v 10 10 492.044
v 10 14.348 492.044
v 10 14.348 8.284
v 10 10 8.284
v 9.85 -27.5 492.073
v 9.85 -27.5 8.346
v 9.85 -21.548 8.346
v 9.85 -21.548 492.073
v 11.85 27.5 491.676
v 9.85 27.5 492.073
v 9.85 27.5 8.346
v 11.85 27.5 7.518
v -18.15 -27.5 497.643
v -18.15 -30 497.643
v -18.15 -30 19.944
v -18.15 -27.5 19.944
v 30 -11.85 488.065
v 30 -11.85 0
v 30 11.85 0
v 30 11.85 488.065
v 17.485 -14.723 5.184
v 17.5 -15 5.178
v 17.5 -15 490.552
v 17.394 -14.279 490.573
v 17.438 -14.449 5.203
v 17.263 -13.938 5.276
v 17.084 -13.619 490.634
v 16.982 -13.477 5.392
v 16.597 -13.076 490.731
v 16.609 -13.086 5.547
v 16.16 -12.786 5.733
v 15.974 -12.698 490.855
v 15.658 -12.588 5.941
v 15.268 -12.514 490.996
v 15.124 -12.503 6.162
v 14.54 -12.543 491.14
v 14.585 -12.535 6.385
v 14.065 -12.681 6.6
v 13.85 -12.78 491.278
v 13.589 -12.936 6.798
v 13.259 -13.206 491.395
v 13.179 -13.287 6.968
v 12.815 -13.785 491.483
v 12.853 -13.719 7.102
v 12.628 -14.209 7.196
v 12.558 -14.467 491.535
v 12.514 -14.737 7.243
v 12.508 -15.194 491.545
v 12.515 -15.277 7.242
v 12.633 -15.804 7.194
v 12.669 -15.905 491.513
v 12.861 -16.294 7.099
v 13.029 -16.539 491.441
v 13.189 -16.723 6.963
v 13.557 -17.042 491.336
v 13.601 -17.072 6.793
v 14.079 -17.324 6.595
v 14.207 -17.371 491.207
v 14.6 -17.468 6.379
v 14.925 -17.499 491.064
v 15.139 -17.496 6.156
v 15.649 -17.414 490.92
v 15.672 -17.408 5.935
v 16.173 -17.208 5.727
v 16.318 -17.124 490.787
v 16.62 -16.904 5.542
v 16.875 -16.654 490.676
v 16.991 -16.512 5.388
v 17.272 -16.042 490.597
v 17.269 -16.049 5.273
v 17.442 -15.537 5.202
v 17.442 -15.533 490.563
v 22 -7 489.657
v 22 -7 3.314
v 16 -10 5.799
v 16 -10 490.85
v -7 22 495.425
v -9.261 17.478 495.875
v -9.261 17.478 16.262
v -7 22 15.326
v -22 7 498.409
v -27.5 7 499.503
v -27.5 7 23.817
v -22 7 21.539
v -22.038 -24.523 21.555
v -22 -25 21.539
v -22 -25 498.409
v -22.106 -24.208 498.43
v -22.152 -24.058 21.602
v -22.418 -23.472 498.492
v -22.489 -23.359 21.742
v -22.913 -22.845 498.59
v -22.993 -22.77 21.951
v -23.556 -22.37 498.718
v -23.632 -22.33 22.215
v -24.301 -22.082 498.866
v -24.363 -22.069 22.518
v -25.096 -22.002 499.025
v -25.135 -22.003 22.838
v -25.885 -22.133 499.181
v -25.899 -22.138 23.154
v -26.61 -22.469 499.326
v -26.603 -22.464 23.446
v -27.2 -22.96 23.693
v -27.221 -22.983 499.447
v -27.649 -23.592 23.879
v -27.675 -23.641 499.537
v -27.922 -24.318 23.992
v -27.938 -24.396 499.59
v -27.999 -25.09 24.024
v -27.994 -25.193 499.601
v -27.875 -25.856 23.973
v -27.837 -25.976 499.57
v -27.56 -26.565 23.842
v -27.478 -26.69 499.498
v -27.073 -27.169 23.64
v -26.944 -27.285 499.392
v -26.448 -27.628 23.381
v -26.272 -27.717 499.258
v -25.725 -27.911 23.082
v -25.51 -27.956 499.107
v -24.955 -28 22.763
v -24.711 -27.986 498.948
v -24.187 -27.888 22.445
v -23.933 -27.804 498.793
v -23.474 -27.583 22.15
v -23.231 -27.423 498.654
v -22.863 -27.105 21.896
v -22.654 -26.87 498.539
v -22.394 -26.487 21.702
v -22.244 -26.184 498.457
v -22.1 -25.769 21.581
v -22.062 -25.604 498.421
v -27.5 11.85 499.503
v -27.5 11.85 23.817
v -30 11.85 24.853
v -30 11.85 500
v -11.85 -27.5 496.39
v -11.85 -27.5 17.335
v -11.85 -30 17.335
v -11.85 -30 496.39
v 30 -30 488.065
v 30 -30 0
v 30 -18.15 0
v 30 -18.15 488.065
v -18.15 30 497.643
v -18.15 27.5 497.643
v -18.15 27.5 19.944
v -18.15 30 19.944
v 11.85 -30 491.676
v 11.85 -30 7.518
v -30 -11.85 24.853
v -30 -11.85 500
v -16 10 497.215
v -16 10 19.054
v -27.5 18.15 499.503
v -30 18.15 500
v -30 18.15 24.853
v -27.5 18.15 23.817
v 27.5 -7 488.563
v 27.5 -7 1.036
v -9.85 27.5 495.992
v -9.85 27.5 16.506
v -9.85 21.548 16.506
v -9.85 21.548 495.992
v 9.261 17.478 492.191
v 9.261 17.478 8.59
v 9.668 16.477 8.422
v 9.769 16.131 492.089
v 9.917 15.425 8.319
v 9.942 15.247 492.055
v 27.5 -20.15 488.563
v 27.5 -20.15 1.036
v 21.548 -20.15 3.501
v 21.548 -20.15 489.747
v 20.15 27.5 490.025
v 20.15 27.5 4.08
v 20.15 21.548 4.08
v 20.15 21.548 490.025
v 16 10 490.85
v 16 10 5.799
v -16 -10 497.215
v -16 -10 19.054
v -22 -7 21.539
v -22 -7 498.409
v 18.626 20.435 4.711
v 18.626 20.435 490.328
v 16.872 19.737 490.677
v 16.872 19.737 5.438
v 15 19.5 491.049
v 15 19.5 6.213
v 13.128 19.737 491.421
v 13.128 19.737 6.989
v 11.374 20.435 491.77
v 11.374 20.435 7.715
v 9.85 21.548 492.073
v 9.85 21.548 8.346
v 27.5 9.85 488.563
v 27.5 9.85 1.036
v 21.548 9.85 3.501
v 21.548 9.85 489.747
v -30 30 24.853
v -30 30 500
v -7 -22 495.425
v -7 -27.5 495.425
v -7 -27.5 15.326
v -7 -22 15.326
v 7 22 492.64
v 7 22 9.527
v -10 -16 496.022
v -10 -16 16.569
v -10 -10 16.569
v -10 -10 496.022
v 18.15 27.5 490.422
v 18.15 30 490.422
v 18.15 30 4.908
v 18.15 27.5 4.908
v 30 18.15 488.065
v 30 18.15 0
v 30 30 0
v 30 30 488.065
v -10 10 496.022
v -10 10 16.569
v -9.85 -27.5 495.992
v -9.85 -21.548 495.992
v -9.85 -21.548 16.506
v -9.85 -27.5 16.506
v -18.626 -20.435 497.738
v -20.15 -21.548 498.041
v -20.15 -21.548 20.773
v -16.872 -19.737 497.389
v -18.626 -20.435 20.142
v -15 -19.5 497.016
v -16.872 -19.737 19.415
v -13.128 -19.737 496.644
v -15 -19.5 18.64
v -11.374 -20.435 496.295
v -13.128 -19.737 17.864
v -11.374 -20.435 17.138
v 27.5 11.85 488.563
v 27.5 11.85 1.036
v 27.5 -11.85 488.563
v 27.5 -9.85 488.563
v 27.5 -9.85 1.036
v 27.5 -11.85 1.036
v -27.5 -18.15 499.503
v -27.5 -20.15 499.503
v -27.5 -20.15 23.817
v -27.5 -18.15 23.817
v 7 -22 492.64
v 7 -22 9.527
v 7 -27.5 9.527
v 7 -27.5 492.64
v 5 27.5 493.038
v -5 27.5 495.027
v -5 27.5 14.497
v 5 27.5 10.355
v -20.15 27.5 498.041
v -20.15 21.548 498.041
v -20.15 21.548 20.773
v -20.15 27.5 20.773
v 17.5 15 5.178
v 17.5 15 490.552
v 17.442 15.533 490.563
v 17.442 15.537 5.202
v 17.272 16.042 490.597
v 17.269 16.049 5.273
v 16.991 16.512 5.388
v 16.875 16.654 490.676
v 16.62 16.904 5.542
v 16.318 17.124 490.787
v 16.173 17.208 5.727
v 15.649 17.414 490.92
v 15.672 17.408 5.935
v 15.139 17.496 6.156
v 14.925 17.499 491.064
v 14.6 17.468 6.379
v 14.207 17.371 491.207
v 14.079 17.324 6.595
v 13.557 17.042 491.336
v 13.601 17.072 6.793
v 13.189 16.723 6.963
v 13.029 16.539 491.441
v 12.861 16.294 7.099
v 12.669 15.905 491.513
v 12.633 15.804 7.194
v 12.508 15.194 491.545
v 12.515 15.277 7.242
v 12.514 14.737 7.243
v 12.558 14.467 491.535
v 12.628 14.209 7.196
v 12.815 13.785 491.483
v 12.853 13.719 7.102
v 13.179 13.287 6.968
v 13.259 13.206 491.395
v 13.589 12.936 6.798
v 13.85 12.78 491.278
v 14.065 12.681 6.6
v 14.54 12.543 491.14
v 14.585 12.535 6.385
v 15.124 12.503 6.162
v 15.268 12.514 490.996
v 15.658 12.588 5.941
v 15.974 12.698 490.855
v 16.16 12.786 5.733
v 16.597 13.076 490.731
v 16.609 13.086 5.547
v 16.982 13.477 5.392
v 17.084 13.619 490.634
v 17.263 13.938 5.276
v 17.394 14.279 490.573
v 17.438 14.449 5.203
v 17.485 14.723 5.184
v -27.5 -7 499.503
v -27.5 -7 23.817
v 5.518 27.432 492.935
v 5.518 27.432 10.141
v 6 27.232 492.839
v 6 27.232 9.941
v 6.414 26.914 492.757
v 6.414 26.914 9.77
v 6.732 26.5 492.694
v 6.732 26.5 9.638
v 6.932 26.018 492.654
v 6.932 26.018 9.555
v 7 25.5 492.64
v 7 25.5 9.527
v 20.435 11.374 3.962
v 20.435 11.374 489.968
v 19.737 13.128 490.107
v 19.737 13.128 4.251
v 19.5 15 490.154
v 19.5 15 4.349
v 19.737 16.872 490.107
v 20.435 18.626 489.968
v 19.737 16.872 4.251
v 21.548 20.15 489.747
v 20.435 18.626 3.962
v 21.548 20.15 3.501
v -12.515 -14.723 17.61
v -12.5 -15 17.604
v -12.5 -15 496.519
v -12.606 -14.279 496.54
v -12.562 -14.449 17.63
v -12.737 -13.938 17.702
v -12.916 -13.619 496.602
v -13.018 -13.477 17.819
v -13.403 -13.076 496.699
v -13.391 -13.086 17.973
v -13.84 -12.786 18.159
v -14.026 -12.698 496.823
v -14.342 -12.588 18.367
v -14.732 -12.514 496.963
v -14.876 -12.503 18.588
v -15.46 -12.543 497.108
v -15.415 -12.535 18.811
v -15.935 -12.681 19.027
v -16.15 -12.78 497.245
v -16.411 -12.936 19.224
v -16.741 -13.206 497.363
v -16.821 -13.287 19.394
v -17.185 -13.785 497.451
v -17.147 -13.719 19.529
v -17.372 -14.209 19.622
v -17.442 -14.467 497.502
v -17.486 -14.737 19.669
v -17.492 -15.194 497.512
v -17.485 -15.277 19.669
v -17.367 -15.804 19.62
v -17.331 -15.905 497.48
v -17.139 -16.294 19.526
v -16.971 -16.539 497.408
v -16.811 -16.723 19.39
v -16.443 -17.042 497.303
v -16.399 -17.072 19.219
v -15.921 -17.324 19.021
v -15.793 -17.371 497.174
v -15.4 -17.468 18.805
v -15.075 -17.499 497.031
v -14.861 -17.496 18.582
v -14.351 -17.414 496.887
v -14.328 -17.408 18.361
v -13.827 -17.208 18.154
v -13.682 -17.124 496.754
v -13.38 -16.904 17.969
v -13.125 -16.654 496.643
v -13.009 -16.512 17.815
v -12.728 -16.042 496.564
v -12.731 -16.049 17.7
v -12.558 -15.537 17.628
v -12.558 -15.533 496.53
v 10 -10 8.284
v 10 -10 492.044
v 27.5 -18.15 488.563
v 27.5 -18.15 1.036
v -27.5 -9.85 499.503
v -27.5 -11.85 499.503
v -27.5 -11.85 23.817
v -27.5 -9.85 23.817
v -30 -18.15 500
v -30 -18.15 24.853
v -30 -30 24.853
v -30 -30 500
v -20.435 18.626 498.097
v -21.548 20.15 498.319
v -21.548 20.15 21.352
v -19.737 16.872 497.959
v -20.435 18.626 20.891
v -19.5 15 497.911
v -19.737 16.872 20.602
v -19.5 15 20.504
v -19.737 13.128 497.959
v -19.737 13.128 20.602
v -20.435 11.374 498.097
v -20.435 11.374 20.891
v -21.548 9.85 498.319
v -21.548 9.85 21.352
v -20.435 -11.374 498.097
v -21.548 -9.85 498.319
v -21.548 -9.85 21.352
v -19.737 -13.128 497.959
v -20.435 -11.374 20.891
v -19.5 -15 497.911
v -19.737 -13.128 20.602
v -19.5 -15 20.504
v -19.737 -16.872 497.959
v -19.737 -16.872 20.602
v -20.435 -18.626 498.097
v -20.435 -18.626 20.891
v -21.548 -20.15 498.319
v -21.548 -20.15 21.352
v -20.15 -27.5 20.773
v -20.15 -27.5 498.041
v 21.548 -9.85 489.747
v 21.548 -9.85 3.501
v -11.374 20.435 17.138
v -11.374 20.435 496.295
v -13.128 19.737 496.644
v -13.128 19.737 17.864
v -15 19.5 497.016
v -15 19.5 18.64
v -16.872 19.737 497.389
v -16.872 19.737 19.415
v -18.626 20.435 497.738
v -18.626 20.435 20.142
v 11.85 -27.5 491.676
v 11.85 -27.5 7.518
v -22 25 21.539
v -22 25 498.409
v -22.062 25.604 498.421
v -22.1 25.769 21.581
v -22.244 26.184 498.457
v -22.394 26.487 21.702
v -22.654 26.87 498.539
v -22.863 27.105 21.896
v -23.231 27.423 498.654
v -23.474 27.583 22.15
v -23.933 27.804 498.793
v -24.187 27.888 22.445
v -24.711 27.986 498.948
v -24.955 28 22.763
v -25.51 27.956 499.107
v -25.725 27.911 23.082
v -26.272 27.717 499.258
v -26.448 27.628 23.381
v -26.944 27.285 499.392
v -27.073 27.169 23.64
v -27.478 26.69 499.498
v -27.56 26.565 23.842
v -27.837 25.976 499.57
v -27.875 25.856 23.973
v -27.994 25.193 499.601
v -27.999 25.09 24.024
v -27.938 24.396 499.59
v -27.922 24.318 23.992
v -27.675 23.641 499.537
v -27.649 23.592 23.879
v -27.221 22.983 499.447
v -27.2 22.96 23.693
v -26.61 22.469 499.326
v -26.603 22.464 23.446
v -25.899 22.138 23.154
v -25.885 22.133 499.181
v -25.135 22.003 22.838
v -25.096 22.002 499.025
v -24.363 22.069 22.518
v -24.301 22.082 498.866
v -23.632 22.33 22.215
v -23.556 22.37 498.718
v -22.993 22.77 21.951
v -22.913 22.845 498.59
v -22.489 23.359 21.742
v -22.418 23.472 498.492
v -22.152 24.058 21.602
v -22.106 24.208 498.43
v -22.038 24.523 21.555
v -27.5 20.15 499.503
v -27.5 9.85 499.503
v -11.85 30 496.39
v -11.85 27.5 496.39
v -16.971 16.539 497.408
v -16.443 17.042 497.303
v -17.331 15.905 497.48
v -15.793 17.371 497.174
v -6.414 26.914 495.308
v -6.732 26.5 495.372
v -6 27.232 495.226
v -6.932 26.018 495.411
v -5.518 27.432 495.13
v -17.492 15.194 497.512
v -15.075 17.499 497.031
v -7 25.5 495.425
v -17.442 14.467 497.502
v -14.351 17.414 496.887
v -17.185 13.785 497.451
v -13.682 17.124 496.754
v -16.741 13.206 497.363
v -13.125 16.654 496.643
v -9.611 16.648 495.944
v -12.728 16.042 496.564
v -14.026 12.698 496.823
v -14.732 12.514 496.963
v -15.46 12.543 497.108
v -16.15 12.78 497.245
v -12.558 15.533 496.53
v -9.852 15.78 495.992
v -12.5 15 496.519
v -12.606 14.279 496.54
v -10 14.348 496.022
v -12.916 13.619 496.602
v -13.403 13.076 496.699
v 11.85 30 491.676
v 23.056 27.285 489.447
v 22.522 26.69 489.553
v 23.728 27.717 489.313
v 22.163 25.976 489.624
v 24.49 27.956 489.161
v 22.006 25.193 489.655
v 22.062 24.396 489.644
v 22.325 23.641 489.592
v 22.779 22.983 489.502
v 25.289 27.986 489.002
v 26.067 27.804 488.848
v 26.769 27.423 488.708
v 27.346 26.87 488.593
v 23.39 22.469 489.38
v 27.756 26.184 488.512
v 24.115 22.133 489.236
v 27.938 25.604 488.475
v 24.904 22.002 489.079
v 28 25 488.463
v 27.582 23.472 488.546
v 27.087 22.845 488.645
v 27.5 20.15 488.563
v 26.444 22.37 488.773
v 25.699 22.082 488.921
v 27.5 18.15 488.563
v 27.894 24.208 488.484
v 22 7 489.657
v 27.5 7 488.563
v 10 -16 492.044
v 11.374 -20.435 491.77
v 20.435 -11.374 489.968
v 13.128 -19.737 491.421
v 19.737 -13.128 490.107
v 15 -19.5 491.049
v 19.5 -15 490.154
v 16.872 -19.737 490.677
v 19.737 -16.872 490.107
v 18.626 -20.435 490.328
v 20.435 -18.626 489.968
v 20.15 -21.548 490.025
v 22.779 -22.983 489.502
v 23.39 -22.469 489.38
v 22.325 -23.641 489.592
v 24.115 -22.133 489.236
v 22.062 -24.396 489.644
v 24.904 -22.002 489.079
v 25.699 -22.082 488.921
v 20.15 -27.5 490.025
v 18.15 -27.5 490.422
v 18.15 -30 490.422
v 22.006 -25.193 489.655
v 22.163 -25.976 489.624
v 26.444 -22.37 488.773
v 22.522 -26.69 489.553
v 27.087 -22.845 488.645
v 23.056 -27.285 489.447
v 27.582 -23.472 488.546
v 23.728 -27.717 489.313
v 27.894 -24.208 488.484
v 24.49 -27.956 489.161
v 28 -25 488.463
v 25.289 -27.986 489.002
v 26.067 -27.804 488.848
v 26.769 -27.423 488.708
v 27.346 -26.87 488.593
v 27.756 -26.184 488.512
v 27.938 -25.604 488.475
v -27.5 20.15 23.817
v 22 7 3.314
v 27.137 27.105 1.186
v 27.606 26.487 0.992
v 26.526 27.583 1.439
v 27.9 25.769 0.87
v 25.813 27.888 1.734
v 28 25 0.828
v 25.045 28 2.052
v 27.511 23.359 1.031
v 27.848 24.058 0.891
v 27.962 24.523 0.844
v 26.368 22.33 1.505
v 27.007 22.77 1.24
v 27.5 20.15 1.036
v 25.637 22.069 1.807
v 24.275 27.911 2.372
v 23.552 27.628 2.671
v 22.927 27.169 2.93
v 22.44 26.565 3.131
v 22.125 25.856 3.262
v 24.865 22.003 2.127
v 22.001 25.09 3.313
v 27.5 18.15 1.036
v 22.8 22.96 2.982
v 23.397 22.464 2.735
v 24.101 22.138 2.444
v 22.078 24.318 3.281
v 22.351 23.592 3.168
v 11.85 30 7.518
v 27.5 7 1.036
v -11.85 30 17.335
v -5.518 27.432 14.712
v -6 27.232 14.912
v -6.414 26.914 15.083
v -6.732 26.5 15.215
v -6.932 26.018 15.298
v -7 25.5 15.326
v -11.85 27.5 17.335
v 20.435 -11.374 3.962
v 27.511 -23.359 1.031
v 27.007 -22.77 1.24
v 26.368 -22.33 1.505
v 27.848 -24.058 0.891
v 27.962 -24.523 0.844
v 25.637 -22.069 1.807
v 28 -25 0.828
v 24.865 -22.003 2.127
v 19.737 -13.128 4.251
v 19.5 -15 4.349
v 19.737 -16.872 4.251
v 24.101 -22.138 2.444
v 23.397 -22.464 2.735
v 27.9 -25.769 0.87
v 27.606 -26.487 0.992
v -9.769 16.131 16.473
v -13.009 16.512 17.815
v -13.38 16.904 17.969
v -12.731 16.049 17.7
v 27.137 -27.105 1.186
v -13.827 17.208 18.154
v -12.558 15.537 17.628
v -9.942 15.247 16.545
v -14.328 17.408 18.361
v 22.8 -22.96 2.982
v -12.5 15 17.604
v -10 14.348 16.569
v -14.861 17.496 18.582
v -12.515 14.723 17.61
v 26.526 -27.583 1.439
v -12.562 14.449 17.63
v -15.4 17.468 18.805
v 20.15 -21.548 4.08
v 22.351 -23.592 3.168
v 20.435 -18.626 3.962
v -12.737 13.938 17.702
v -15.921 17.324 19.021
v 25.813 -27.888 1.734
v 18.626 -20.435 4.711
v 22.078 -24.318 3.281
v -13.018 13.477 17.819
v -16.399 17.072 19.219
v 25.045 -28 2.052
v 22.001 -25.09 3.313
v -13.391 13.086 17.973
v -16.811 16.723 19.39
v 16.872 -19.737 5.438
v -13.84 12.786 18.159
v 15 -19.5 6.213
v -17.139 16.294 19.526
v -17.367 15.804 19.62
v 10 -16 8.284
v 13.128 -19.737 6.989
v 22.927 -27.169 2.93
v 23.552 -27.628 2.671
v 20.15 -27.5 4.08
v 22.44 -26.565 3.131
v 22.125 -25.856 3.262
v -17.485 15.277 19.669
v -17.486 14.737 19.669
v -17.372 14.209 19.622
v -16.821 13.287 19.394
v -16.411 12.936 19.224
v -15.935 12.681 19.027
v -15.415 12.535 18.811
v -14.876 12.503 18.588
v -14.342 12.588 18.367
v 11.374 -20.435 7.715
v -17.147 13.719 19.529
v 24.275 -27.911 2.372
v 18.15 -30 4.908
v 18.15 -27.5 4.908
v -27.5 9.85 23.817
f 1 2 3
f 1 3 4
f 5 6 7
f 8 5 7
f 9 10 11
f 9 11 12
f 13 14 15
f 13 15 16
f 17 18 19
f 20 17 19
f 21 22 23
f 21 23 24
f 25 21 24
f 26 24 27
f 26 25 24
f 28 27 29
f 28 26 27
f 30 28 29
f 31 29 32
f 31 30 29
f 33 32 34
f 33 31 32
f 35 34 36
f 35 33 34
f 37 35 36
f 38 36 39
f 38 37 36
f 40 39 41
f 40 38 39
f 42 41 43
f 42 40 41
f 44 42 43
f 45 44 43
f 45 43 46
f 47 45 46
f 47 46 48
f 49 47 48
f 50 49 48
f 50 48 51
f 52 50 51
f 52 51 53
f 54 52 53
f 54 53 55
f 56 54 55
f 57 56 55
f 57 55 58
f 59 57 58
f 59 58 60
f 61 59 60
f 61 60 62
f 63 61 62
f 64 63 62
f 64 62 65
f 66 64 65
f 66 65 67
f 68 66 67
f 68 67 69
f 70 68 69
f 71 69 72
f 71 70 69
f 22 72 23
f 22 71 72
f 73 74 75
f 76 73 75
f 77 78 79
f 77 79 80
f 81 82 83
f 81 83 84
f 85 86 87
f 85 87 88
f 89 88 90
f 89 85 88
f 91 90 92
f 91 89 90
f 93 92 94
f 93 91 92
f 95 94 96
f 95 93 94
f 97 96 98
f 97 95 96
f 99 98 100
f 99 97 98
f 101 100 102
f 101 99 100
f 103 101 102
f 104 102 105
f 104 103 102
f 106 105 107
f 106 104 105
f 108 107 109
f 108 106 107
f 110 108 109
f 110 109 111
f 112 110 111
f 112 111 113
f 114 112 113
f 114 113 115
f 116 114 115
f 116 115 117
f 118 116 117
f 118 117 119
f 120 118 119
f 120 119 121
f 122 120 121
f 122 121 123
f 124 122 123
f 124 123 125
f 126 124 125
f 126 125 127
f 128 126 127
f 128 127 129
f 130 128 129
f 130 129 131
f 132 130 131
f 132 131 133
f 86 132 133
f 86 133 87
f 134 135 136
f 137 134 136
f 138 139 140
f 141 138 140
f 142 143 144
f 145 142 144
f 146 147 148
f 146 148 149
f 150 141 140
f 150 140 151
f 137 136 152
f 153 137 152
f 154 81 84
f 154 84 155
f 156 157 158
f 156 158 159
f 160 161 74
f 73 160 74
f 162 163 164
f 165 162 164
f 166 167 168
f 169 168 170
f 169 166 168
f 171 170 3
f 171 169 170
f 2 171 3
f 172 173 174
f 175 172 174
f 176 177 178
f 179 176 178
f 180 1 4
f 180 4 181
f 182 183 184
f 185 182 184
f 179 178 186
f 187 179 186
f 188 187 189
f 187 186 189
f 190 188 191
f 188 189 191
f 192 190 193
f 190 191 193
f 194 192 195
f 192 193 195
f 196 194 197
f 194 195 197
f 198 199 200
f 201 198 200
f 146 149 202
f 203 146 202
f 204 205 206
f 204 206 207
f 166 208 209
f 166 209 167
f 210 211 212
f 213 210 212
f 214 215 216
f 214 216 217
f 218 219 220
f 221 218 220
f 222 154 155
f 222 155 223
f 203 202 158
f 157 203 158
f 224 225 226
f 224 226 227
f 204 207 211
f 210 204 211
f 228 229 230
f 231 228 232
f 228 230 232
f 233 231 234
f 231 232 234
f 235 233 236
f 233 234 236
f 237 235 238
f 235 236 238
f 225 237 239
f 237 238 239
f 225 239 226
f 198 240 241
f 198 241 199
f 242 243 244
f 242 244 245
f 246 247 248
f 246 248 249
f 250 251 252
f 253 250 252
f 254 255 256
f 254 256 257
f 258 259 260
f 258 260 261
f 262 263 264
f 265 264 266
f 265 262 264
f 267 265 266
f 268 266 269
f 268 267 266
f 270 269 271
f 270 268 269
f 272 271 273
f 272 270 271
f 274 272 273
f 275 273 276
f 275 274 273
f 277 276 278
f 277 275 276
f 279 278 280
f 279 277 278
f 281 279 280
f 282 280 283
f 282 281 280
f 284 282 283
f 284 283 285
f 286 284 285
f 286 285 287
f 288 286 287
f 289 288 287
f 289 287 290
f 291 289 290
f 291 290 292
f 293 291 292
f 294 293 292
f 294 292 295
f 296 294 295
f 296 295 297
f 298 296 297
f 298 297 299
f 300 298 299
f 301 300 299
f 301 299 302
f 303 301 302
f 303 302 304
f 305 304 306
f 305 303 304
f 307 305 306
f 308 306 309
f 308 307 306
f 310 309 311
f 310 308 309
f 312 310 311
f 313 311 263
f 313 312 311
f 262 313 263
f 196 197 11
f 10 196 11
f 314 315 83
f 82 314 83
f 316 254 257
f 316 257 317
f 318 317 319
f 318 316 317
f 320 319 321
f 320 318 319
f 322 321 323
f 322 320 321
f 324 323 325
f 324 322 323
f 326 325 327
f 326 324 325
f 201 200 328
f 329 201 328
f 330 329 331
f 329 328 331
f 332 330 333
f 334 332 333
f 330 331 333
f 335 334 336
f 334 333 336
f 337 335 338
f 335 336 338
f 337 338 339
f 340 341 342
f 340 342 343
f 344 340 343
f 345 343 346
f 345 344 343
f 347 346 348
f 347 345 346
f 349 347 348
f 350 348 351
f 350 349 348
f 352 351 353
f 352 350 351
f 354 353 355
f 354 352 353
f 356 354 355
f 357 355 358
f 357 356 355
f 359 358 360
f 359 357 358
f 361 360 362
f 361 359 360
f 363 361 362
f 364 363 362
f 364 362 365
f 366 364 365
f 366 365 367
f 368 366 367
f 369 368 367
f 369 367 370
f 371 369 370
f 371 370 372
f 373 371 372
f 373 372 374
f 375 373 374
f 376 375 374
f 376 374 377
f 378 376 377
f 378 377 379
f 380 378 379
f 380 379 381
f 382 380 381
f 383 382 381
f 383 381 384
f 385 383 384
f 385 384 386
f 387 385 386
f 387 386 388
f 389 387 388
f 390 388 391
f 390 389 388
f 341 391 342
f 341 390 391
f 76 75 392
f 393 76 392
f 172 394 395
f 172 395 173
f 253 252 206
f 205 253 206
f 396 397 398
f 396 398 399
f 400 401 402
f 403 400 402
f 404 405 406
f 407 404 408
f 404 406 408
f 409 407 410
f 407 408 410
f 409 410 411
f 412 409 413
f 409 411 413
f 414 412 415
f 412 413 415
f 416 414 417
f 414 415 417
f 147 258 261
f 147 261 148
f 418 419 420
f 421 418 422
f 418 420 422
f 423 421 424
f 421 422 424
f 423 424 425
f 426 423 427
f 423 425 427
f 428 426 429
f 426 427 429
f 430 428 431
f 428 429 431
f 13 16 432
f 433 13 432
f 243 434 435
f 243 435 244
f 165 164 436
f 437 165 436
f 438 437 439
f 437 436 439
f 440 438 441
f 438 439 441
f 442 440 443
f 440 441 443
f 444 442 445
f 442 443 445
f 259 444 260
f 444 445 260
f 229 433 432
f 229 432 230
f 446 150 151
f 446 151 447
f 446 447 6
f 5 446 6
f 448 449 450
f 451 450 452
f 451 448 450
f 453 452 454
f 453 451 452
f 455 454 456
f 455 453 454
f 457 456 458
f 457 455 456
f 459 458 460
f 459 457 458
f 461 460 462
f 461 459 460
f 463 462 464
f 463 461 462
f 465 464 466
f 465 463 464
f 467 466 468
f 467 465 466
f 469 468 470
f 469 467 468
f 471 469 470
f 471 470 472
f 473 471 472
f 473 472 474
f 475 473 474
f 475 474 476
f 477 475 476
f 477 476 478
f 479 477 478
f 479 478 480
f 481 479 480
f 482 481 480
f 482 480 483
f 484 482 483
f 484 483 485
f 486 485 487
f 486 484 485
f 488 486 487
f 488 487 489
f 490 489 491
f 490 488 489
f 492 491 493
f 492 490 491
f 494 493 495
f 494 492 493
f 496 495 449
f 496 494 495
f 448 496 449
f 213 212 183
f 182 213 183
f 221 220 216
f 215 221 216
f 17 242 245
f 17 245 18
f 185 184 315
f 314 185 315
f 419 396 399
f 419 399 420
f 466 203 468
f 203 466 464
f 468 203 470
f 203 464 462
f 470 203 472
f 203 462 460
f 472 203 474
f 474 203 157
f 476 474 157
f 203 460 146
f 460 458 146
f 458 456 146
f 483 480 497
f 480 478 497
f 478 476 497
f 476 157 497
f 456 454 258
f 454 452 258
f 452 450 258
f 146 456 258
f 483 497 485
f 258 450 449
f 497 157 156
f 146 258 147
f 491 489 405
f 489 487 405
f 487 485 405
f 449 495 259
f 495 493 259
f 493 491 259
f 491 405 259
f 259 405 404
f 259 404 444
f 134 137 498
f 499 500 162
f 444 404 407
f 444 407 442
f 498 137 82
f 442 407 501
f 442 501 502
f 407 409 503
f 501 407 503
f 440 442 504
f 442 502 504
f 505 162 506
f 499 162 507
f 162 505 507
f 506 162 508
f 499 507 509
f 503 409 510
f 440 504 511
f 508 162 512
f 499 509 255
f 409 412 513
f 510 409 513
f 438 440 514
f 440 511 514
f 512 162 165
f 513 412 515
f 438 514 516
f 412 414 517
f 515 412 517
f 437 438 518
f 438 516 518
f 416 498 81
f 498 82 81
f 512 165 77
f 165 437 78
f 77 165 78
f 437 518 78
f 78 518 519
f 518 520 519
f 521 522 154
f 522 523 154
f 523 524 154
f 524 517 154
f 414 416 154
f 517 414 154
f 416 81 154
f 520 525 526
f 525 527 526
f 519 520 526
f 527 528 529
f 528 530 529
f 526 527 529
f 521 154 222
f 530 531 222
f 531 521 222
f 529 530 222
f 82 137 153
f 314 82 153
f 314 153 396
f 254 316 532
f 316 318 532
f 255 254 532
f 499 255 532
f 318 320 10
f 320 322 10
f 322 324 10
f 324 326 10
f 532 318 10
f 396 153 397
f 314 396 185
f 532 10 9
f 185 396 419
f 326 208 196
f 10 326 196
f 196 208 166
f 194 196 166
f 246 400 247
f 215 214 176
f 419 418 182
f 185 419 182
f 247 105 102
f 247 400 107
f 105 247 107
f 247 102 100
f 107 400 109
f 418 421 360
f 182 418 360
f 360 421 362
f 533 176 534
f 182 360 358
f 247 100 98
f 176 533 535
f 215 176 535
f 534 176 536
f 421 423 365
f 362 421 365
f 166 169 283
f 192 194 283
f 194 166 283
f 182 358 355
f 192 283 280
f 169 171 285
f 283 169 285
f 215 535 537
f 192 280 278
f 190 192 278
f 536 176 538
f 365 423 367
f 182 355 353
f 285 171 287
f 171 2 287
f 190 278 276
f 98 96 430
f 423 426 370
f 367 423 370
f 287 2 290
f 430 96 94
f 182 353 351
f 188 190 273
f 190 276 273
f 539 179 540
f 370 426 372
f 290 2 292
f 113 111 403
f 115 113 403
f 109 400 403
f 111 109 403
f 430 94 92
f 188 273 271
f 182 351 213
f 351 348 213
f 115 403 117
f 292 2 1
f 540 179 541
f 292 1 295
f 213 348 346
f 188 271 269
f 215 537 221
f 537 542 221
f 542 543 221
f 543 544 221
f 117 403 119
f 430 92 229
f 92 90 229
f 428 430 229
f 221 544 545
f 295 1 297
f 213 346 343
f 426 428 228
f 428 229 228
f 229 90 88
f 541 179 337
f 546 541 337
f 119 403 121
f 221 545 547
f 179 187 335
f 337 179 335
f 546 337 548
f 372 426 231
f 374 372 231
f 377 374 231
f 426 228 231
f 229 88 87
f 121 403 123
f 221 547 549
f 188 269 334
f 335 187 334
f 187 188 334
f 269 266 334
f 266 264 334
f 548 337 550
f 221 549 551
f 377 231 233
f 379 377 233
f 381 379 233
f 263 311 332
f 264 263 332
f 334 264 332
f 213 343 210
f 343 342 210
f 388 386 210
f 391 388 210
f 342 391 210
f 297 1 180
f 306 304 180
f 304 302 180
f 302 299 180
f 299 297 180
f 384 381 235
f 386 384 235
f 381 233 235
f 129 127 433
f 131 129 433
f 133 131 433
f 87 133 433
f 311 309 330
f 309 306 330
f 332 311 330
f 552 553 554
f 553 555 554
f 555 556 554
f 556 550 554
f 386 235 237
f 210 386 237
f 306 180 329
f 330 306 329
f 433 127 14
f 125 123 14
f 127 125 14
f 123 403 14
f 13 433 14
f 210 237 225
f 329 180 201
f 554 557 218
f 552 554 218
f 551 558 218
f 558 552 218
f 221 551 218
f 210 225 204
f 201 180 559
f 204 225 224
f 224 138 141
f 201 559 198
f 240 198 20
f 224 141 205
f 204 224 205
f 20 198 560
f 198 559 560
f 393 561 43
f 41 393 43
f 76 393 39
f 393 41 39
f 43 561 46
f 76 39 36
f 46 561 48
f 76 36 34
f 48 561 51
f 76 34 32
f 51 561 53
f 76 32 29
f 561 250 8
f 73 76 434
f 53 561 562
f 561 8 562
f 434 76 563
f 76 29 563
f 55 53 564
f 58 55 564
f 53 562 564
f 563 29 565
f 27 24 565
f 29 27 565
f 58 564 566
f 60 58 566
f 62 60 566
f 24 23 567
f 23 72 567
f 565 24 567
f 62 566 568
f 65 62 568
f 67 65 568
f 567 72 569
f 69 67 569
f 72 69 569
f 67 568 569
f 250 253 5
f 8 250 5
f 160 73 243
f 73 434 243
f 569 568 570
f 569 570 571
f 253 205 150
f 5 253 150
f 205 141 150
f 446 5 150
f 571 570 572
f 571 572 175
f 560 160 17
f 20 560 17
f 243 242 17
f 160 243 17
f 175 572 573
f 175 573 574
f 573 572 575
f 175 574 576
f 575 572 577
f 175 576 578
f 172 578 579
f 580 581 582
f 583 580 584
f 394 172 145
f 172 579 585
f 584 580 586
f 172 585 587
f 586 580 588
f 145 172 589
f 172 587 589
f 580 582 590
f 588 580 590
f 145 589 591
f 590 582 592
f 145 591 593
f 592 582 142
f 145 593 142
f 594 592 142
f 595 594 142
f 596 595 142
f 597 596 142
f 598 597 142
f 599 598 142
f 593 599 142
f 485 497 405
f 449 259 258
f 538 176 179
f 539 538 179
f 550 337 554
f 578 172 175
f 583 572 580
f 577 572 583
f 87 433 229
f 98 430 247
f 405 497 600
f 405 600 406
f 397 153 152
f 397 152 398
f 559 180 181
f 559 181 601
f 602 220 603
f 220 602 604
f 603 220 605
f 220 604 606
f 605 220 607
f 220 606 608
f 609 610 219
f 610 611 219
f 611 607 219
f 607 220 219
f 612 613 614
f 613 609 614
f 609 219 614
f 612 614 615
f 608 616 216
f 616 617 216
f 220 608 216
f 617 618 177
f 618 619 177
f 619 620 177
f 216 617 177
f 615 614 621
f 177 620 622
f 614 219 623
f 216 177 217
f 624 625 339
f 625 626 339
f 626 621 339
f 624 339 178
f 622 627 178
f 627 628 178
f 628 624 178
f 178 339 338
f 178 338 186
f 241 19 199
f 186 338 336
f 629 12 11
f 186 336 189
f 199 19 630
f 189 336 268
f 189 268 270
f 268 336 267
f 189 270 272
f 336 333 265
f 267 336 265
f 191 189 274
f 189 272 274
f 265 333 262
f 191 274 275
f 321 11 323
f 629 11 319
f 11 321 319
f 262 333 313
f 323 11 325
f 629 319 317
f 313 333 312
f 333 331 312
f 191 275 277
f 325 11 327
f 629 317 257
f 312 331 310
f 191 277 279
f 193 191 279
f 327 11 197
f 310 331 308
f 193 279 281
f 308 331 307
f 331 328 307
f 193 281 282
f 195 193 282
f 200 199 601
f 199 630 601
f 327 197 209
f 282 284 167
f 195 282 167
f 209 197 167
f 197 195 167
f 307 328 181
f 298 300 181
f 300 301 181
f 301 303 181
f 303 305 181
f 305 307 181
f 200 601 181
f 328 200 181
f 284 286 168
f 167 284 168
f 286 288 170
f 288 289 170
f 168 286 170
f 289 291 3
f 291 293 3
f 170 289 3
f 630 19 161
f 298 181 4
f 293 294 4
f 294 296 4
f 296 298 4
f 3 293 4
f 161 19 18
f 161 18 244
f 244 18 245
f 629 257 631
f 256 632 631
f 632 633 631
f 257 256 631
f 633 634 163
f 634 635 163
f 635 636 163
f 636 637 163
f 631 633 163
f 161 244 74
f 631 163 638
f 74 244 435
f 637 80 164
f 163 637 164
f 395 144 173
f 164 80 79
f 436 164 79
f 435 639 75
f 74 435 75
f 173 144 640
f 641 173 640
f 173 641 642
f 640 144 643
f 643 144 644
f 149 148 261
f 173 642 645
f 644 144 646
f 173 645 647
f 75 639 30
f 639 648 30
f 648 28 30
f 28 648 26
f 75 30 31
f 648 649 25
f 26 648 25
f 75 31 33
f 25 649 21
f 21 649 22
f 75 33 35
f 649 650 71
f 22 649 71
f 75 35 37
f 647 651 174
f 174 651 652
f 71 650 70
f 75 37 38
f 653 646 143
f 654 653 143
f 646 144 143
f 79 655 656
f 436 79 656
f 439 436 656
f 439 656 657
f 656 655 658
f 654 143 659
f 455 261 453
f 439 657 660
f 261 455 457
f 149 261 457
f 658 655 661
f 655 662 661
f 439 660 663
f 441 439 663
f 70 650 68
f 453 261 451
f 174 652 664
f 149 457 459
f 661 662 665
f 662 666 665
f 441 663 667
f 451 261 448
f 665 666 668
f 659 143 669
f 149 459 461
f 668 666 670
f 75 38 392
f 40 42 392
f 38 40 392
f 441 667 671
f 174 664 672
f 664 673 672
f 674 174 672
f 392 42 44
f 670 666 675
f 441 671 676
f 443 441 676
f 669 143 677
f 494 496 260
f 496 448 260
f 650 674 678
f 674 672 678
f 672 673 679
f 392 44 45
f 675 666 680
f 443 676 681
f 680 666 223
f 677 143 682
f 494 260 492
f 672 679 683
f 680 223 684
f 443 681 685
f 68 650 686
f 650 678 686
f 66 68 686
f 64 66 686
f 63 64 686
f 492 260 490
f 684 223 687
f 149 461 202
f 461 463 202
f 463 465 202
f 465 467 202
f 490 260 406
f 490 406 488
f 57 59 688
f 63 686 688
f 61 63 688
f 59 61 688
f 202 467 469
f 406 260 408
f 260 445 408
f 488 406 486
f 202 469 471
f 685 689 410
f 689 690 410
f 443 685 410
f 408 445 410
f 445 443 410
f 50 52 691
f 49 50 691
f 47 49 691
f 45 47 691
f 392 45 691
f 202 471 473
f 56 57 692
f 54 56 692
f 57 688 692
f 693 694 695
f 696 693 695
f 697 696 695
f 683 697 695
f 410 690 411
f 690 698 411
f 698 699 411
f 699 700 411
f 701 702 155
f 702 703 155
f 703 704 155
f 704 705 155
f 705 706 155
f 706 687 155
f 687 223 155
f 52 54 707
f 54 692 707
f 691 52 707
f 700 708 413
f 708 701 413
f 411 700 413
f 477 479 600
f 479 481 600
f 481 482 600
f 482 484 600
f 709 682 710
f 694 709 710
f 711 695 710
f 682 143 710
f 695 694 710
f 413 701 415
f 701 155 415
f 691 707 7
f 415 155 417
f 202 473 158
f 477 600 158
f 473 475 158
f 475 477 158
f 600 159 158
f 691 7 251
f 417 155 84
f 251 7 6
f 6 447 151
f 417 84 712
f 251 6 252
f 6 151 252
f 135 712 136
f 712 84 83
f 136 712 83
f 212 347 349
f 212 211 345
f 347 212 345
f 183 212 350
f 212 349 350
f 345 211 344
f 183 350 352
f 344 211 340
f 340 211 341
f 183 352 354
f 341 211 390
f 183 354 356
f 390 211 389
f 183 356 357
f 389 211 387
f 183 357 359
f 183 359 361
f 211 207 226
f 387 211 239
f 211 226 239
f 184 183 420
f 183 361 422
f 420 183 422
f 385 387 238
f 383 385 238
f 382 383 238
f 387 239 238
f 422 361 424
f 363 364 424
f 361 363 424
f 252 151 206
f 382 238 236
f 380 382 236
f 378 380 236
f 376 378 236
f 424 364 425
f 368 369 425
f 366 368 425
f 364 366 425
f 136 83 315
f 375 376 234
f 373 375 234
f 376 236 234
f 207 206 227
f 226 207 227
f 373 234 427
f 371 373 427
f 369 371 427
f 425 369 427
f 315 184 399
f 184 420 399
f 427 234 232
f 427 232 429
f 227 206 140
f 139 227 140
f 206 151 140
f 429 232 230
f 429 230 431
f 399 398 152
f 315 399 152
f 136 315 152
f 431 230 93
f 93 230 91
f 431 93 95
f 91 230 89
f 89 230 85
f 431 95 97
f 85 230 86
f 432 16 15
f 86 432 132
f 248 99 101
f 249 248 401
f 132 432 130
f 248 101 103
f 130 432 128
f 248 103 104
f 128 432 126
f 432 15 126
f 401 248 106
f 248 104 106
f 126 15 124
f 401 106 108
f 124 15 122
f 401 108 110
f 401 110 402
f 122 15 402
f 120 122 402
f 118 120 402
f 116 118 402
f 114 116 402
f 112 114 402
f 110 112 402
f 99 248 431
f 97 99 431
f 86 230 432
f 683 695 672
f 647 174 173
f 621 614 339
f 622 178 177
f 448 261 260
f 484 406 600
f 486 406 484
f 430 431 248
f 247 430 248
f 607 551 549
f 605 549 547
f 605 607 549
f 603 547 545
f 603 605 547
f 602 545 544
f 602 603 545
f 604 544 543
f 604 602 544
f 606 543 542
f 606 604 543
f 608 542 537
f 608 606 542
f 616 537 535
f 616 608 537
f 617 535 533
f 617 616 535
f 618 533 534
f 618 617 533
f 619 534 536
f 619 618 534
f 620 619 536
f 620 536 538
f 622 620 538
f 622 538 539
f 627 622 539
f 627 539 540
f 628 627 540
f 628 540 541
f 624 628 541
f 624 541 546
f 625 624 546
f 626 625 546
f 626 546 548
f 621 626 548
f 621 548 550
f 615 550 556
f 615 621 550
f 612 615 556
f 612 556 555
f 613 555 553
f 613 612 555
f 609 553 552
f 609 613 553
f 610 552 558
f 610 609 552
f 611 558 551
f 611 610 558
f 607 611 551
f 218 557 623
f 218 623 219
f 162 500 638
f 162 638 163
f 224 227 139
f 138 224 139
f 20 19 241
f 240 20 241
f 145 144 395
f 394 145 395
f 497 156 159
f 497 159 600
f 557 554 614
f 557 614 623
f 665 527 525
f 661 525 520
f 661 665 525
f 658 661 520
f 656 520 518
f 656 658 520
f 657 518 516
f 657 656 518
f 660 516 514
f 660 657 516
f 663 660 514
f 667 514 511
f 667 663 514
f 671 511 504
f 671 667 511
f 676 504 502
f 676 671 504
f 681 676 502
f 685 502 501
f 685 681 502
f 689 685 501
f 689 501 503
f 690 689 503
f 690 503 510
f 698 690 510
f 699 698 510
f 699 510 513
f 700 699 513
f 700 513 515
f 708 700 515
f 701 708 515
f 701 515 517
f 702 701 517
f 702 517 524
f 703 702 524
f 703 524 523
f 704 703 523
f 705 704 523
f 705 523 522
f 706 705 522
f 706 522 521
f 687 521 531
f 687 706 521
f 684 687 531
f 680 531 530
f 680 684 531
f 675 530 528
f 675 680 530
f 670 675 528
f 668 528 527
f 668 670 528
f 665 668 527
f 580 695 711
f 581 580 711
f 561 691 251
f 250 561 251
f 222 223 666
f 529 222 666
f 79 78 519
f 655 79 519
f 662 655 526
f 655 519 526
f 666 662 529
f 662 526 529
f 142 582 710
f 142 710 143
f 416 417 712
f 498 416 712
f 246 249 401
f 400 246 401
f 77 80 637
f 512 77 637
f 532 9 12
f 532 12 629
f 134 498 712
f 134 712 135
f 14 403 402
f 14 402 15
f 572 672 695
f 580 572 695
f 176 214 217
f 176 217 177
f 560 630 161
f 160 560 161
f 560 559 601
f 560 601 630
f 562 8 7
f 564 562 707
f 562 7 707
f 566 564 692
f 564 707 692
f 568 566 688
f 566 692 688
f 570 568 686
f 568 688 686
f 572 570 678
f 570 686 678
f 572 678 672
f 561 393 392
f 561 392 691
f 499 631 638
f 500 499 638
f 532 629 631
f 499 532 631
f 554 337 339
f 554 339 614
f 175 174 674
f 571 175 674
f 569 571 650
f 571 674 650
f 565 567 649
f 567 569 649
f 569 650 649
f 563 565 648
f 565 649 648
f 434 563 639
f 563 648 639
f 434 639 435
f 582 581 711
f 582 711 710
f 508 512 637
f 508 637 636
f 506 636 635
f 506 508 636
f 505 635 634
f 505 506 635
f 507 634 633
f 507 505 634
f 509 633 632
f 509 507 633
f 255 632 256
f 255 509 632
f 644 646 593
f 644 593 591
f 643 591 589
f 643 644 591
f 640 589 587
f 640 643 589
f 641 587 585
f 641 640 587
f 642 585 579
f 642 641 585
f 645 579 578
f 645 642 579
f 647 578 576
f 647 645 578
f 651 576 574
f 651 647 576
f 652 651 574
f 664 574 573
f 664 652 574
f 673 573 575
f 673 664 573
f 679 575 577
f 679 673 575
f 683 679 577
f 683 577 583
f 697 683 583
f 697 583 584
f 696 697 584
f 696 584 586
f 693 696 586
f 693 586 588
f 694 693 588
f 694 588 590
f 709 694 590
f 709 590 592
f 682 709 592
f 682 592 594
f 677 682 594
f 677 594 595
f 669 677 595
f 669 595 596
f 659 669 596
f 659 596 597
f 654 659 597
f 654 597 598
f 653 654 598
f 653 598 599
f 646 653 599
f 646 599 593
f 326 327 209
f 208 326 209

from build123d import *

# Parameters (mm, degrees)
F0_R          = 3
F0_R_2        = 2.5
F1_DEPTH      = 500
F2_R          = 2
F3_R          = 7
F6_DEPTH      = 30
F6_DEPTH_BACK = 30


# Not quite as in the source:
# - a feature names something its author has since deleted; it is built from what else it names


with BuildPart() as f1:
    # F0 (on Top) → F1 (new body)
    with BuildSketch(Plane.XY):
        with BuildLine():
            Line((18.15, -30), (30, -30))
            Line((30, -30), (30, -18.15))
            Line((30, -18.15), (27.5, -18.15))
            Line((27.5, -18.15), (27.5, -20.15))
            Line((27.5, -20.15), (21.5477069044, -20.15))
            ThreePointArc((21.5477069044, -20.15), (19.5, -15), (21.5477069044, -9.85))
            Line((21.5477069044, -9.85), (27.5, -9.85))
            Line((27.5, -9.85), (27.5, -11.85))
            Line((27.5, -11.85), (30, -11.85))
            Line((30, -11.85), (30, 11.85))
            Line((30, 11.85), (27.5, 11.85))
            Line((27.5, 11.85), (27.5, 9.85))
            Line((27.5, 9.85), (21.5477069044, 9.85))
            ThreePointArc((21.5477069044, 9.85), (19.5, 15), (21.5477069044, 20.15))
            Line((21.5477069044, 20.15), (27.5, 20.15))
            Line((27.5, 20.15), (27.5, 18.15))
            Line((27.5, 18.15), (30, 18.15))
            Line((30, 18.15), (30, 30))
            Line((30, 30), (18.15, 30))
            Line((18.15, 30), (18.15, 27.5))
            Line((18.15, 27.5), (20.15, 27.5))
            Line((20.15, 27.5), (20.15, 21.5477069044))
            ThreePointArc((20.15, 21.5477069044), (15, 19.5), (9.85, 21.5477069044))
            Line((9.85, 21.5477069044), (9.85, 27.5))
            Line((9.85, 27.5), (11.85, 27.5))
            Line((11.85, 27.5), (11.85, 30))
            Line((11.85, 30), (-11.85, 30))
            Line((-11.85, 30), (-11.85, 27.5))
            Line((-11.85, 27.5), (-9.85, 27.5))
            Line((-9.85, 27.5), (-9.85, 21.5477069044))
            ThreePointArc((-9.85, 21.5477069044), (-15, 19.5), (-20.15, 21.5477069044))
            Line((-20.15, 21.5477069044), (-20.15, 27.5))
            Line((-20.15, 27.5), (-18.15, 27.5))
            Line((-18.15, 27.5), (-18.15, 30))
            Line((-18.15, 30), (-30, 30))
            Line((-30, 30), (-30, 18.15))
            Line((-30, 18.15), (-27.5, 18.15))
            Line((-27.5, 18.15), (-27.5, 20.15))
            Line((-27.5, 20.15), (-21.5477069044, 20.15))
            ThreePointArc((-21.5477069044, 20.15), (-19.5, 15), (-21.5477069044, 9.85))
            Line((-21.5477069044, 9.85), (-27.5, 9.85))
            Line((-27.5, 9.85), (-27.5, 11.85))
            Line((-27.5, 11.85), (-30, 11.85))
            Line((-30, 11.85), (-30, -11.85))
            Line((-30, -11.85), (-27.5, -11.85))
            Line((-27.5, -11.85), (-27.5, -9.85))
            Line((-27.5, -9.85), (-21.5477069044, -9.85))
            ThreePointArc((-21.5477069044, -9.85), (-19.5, -15), (-21.5477069044, -20.15))
            Line((-21.5477069044, -20.15), (-27.5, -20.15))
            Line((-27.5, -20.15), (-27.5, -18.15))
            Line((-27.5, -18.15), (-30, -18.15))
            Line((-30, -18.15), (-30, -30))
            Line((-30, -30), (-18.15, -30))
            Line((-18.15, -30), (-18.15, -27.5))
            Line((-18.15, -27.5), (-20.15, -27.5))
            Line((-20.15, -27.5), (-20.15, -21.5477069044))
            ThreePointArc((-20.15, -21.5477069044), (-15, -19.5), (-9.85, -21.5477069044))
            Line((-9.85, -21.5477069044), (-9.85, -27.5))
            Line((-9.85, -27.5), (-11.85, -27.5))
            Line((-11.85, -27.5), (-11.85, -30))
            Line((-11.85, -30), (11.85, -30))
            Line((11.85, -30), (11.85, -27.5))
            Line((11.85, -27.5), (9.85, -27.5))
            Line((9.85, -27.5), (9.85, -21.5477069044))
            ThreePointArc((9.85, -21.5477069044), (15, -19.5), (20.15, -21.5477069044))
            Line((20.15, -21.5477069044), (20.15, -27.5))
            Line((20.15, -27.5), (18.15, -27.5))
            Line((18.15, -27.5), (18.15, -30))
        make_face()
        with Locations((-25, -25)):
            Circle(F0_R, mode=Mode.SUBTRACT)
        with Locations((-15, -15)):
            Circle(F0_R_2, mode=Mode.SUBTRACT)
        with Locations((25, -25)):
            Circle(F0_R, mode=Mode.SUBTRACT)
        with Locations((15, -15)):
            Circle(F0_R_2, mode=Mode.SUBTRACT)
        with Locations((-25, 25)):
            Circle(F0_R, mode=Mode.SUBTRACT)
        with Locations((-15, 15)):
            Circle(F0_R_2, mode=Mode.SUBTRACT)
        Polygon((-7, 22), (-7, 27.5), (0, 27.5), (7, 27.5), (7, 22), (10, 16), (10, 10), (16, 10), (22, 7), (27.5, 7), (27.5, 0), (27.5, -7), (22, -7), (16, -10), (10, -10), (10, -16), (7, -22), (7, -27.5), (0, -27.5), (-7, -27.5), (-7, -22), (-10, -16), (-10, -10), (-16, -10), (-22, -7), (-27.5, -7), (-27.5, 0), (-27.5, 7), (-22, 7), (-16, 10), (-10, 10), (-10, 16), align=None, mode=Mode.SUBTRACT)
        with Locations((15, 15)):
            Circle(F0_R_2, mode=Mode.SUBTRACT)
        with Locations((25, 25)):
            Circle(F0_R, mode=Mode.SUBTRACT)
    extrude(amount=F1_DEPTH)

    # F2
    f2_edges = [f1.edges().sort_by_distance(p)[0] for p in [
        (-7, 27.5, 250),
        (7, 27.5, 250),
    ]]
    fillet(f2_edges, radius=F2_R)

    # F3
    f3_edges = [f1.edges().sort_by_distance(p)[0] for p in [
        (-10, 16, 250),
        (10, 16, 250),
    ]]
    fillet(f3_edges, radius=F3_R)

    # F5 (on Front) → F6 (cut, two sides)
    with BuildSketch(Plane.XZ) as f6_sk:
        Polygon((190.5190290352, 666.216575566), (10.1971706169, 702.0848233142), (-30, 500), (150.3218584183, 464.1317522517), align=None)
        Polygon((-47.8999755124, -188.0671773906), (30, 0), (-147.6190188423, 73.5722065399), (-225.5189943547, -114.4949708507), align=None)
    extrude(amount=F6_DEPTH, mode=Mode.SUBTRACT)
    extrude(f6_sk.sketch, amount=-F6_DEPTH_BACK, mode=Mode.SUBTRACT)


solid = f1.part
